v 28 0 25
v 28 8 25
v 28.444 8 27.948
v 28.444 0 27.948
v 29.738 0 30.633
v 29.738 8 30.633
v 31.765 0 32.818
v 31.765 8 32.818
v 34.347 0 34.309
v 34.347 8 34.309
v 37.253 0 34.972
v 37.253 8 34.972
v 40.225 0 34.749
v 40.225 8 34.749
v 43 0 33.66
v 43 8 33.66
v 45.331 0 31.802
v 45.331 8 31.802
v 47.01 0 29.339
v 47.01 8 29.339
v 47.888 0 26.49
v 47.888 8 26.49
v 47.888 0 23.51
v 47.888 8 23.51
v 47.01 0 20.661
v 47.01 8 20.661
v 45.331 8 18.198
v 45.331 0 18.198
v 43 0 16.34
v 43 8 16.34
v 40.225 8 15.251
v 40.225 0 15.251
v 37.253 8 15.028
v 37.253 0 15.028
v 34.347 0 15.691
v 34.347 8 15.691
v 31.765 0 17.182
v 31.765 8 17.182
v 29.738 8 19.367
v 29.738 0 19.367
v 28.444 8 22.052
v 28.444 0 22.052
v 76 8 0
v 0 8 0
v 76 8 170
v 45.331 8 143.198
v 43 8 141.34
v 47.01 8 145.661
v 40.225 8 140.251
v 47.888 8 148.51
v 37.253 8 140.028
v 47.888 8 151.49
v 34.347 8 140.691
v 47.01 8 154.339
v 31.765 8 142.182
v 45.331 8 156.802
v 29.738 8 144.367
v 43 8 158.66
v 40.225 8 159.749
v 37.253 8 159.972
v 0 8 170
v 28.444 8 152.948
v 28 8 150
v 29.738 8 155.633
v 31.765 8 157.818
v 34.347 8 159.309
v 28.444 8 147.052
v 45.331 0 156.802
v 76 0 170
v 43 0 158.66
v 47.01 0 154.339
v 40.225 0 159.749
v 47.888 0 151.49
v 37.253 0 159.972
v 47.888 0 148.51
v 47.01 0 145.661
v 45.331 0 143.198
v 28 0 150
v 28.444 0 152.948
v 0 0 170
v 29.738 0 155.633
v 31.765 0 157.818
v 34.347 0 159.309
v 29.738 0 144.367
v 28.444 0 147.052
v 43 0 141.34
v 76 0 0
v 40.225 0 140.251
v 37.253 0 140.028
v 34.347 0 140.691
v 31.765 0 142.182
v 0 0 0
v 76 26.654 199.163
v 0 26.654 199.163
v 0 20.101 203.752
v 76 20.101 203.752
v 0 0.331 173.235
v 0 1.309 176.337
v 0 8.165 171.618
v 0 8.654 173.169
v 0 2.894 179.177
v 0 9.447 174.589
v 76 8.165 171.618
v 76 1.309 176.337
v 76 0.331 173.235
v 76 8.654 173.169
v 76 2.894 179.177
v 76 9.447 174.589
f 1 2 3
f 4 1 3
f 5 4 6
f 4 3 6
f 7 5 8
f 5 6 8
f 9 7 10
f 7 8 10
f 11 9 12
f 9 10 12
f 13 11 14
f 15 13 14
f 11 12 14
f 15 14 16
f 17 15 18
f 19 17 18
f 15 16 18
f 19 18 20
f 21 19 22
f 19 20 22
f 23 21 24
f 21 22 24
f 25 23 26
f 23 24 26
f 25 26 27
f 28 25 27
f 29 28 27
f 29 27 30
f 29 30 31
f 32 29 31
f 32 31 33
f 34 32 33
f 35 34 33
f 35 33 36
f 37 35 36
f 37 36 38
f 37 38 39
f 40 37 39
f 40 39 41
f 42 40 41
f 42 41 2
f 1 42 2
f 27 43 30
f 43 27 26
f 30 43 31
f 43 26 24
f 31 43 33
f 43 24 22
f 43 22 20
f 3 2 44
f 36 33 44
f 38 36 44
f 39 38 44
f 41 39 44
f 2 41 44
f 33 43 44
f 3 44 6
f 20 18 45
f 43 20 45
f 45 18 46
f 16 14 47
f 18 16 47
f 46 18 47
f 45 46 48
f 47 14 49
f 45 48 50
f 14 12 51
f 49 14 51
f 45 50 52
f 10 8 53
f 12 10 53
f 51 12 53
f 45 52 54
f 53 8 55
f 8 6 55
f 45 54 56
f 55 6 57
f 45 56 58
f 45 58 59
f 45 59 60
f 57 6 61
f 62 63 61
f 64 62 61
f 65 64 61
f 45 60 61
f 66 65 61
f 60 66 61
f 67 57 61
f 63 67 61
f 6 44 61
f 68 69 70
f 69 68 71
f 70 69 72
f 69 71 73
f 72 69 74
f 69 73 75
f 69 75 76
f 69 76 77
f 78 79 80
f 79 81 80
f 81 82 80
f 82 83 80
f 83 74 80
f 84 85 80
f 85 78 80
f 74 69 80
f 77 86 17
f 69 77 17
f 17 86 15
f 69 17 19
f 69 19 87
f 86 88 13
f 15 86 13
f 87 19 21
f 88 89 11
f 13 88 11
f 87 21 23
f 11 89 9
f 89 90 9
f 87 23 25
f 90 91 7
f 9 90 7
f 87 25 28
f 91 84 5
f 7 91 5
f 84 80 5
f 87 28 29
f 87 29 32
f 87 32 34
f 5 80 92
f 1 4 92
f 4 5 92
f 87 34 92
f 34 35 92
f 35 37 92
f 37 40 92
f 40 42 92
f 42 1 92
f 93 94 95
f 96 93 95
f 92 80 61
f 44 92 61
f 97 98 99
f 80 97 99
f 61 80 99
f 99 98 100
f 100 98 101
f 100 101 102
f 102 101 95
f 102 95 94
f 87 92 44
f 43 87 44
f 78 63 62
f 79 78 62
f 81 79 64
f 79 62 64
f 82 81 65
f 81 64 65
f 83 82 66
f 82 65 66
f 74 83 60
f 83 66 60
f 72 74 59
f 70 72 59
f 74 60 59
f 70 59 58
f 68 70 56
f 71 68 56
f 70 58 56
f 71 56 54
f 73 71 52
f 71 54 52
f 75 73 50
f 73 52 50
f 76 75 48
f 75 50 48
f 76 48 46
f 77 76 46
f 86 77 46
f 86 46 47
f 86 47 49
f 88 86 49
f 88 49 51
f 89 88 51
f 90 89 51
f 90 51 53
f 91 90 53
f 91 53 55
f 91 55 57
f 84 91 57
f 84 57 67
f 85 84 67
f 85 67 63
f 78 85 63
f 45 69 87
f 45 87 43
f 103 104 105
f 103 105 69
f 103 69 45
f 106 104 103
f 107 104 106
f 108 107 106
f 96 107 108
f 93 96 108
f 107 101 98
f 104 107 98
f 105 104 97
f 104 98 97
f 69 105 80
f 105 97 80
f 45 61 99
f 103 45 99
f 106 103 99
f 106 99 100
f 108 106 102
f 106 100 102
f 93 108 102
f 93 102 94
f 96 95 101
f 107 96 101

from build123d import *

# Parameters (mm, degrees)
F1_DEPTH = 76
F2_R     = 10
F3_DEPTH = 8.001


with BuildPart() as f1:
    # F0 (on Right) → F1 (new body)
    with BuildSketch(Plane.YZ):
        with BuildLine():
            Line((0, 170), (0, 0))
            Line((0, 0), (8, 0))
            Line((8, 0), (8, 170))
            ThreePointArc((8, 170), (8.370264, 172.405646), (9.446784, 174.588611))
            Line((9.446784, 174.588611), (26.654077, 199.163173))
            Line((26.654077, 199.163173), (20.10086, 203.751784))
            Line((20.10086, 203.751784), (2.893567, 179.177223))
            ThreePointArc((2.893567, 179.177223), (0.740529, 174.811293), (0, 170))
        make_face()
    extrude(amount=F1_DEPTH)

    # F2 (on face) → F3 (cut, through all)
    with BuildSketch(Plane(origin=(0, 8, 0), x_dir=(-1, 0, 0), z_dir=(0, 1, 0))):
        with Locations((-38, 150)):
            Circle(F2_R)
        with Locations((-38, 25)):
            Circle(F2_R)
    extrude(amount=-F3_DEPTH, mode=Mode.SUBTRACT)


solid = f1.part
